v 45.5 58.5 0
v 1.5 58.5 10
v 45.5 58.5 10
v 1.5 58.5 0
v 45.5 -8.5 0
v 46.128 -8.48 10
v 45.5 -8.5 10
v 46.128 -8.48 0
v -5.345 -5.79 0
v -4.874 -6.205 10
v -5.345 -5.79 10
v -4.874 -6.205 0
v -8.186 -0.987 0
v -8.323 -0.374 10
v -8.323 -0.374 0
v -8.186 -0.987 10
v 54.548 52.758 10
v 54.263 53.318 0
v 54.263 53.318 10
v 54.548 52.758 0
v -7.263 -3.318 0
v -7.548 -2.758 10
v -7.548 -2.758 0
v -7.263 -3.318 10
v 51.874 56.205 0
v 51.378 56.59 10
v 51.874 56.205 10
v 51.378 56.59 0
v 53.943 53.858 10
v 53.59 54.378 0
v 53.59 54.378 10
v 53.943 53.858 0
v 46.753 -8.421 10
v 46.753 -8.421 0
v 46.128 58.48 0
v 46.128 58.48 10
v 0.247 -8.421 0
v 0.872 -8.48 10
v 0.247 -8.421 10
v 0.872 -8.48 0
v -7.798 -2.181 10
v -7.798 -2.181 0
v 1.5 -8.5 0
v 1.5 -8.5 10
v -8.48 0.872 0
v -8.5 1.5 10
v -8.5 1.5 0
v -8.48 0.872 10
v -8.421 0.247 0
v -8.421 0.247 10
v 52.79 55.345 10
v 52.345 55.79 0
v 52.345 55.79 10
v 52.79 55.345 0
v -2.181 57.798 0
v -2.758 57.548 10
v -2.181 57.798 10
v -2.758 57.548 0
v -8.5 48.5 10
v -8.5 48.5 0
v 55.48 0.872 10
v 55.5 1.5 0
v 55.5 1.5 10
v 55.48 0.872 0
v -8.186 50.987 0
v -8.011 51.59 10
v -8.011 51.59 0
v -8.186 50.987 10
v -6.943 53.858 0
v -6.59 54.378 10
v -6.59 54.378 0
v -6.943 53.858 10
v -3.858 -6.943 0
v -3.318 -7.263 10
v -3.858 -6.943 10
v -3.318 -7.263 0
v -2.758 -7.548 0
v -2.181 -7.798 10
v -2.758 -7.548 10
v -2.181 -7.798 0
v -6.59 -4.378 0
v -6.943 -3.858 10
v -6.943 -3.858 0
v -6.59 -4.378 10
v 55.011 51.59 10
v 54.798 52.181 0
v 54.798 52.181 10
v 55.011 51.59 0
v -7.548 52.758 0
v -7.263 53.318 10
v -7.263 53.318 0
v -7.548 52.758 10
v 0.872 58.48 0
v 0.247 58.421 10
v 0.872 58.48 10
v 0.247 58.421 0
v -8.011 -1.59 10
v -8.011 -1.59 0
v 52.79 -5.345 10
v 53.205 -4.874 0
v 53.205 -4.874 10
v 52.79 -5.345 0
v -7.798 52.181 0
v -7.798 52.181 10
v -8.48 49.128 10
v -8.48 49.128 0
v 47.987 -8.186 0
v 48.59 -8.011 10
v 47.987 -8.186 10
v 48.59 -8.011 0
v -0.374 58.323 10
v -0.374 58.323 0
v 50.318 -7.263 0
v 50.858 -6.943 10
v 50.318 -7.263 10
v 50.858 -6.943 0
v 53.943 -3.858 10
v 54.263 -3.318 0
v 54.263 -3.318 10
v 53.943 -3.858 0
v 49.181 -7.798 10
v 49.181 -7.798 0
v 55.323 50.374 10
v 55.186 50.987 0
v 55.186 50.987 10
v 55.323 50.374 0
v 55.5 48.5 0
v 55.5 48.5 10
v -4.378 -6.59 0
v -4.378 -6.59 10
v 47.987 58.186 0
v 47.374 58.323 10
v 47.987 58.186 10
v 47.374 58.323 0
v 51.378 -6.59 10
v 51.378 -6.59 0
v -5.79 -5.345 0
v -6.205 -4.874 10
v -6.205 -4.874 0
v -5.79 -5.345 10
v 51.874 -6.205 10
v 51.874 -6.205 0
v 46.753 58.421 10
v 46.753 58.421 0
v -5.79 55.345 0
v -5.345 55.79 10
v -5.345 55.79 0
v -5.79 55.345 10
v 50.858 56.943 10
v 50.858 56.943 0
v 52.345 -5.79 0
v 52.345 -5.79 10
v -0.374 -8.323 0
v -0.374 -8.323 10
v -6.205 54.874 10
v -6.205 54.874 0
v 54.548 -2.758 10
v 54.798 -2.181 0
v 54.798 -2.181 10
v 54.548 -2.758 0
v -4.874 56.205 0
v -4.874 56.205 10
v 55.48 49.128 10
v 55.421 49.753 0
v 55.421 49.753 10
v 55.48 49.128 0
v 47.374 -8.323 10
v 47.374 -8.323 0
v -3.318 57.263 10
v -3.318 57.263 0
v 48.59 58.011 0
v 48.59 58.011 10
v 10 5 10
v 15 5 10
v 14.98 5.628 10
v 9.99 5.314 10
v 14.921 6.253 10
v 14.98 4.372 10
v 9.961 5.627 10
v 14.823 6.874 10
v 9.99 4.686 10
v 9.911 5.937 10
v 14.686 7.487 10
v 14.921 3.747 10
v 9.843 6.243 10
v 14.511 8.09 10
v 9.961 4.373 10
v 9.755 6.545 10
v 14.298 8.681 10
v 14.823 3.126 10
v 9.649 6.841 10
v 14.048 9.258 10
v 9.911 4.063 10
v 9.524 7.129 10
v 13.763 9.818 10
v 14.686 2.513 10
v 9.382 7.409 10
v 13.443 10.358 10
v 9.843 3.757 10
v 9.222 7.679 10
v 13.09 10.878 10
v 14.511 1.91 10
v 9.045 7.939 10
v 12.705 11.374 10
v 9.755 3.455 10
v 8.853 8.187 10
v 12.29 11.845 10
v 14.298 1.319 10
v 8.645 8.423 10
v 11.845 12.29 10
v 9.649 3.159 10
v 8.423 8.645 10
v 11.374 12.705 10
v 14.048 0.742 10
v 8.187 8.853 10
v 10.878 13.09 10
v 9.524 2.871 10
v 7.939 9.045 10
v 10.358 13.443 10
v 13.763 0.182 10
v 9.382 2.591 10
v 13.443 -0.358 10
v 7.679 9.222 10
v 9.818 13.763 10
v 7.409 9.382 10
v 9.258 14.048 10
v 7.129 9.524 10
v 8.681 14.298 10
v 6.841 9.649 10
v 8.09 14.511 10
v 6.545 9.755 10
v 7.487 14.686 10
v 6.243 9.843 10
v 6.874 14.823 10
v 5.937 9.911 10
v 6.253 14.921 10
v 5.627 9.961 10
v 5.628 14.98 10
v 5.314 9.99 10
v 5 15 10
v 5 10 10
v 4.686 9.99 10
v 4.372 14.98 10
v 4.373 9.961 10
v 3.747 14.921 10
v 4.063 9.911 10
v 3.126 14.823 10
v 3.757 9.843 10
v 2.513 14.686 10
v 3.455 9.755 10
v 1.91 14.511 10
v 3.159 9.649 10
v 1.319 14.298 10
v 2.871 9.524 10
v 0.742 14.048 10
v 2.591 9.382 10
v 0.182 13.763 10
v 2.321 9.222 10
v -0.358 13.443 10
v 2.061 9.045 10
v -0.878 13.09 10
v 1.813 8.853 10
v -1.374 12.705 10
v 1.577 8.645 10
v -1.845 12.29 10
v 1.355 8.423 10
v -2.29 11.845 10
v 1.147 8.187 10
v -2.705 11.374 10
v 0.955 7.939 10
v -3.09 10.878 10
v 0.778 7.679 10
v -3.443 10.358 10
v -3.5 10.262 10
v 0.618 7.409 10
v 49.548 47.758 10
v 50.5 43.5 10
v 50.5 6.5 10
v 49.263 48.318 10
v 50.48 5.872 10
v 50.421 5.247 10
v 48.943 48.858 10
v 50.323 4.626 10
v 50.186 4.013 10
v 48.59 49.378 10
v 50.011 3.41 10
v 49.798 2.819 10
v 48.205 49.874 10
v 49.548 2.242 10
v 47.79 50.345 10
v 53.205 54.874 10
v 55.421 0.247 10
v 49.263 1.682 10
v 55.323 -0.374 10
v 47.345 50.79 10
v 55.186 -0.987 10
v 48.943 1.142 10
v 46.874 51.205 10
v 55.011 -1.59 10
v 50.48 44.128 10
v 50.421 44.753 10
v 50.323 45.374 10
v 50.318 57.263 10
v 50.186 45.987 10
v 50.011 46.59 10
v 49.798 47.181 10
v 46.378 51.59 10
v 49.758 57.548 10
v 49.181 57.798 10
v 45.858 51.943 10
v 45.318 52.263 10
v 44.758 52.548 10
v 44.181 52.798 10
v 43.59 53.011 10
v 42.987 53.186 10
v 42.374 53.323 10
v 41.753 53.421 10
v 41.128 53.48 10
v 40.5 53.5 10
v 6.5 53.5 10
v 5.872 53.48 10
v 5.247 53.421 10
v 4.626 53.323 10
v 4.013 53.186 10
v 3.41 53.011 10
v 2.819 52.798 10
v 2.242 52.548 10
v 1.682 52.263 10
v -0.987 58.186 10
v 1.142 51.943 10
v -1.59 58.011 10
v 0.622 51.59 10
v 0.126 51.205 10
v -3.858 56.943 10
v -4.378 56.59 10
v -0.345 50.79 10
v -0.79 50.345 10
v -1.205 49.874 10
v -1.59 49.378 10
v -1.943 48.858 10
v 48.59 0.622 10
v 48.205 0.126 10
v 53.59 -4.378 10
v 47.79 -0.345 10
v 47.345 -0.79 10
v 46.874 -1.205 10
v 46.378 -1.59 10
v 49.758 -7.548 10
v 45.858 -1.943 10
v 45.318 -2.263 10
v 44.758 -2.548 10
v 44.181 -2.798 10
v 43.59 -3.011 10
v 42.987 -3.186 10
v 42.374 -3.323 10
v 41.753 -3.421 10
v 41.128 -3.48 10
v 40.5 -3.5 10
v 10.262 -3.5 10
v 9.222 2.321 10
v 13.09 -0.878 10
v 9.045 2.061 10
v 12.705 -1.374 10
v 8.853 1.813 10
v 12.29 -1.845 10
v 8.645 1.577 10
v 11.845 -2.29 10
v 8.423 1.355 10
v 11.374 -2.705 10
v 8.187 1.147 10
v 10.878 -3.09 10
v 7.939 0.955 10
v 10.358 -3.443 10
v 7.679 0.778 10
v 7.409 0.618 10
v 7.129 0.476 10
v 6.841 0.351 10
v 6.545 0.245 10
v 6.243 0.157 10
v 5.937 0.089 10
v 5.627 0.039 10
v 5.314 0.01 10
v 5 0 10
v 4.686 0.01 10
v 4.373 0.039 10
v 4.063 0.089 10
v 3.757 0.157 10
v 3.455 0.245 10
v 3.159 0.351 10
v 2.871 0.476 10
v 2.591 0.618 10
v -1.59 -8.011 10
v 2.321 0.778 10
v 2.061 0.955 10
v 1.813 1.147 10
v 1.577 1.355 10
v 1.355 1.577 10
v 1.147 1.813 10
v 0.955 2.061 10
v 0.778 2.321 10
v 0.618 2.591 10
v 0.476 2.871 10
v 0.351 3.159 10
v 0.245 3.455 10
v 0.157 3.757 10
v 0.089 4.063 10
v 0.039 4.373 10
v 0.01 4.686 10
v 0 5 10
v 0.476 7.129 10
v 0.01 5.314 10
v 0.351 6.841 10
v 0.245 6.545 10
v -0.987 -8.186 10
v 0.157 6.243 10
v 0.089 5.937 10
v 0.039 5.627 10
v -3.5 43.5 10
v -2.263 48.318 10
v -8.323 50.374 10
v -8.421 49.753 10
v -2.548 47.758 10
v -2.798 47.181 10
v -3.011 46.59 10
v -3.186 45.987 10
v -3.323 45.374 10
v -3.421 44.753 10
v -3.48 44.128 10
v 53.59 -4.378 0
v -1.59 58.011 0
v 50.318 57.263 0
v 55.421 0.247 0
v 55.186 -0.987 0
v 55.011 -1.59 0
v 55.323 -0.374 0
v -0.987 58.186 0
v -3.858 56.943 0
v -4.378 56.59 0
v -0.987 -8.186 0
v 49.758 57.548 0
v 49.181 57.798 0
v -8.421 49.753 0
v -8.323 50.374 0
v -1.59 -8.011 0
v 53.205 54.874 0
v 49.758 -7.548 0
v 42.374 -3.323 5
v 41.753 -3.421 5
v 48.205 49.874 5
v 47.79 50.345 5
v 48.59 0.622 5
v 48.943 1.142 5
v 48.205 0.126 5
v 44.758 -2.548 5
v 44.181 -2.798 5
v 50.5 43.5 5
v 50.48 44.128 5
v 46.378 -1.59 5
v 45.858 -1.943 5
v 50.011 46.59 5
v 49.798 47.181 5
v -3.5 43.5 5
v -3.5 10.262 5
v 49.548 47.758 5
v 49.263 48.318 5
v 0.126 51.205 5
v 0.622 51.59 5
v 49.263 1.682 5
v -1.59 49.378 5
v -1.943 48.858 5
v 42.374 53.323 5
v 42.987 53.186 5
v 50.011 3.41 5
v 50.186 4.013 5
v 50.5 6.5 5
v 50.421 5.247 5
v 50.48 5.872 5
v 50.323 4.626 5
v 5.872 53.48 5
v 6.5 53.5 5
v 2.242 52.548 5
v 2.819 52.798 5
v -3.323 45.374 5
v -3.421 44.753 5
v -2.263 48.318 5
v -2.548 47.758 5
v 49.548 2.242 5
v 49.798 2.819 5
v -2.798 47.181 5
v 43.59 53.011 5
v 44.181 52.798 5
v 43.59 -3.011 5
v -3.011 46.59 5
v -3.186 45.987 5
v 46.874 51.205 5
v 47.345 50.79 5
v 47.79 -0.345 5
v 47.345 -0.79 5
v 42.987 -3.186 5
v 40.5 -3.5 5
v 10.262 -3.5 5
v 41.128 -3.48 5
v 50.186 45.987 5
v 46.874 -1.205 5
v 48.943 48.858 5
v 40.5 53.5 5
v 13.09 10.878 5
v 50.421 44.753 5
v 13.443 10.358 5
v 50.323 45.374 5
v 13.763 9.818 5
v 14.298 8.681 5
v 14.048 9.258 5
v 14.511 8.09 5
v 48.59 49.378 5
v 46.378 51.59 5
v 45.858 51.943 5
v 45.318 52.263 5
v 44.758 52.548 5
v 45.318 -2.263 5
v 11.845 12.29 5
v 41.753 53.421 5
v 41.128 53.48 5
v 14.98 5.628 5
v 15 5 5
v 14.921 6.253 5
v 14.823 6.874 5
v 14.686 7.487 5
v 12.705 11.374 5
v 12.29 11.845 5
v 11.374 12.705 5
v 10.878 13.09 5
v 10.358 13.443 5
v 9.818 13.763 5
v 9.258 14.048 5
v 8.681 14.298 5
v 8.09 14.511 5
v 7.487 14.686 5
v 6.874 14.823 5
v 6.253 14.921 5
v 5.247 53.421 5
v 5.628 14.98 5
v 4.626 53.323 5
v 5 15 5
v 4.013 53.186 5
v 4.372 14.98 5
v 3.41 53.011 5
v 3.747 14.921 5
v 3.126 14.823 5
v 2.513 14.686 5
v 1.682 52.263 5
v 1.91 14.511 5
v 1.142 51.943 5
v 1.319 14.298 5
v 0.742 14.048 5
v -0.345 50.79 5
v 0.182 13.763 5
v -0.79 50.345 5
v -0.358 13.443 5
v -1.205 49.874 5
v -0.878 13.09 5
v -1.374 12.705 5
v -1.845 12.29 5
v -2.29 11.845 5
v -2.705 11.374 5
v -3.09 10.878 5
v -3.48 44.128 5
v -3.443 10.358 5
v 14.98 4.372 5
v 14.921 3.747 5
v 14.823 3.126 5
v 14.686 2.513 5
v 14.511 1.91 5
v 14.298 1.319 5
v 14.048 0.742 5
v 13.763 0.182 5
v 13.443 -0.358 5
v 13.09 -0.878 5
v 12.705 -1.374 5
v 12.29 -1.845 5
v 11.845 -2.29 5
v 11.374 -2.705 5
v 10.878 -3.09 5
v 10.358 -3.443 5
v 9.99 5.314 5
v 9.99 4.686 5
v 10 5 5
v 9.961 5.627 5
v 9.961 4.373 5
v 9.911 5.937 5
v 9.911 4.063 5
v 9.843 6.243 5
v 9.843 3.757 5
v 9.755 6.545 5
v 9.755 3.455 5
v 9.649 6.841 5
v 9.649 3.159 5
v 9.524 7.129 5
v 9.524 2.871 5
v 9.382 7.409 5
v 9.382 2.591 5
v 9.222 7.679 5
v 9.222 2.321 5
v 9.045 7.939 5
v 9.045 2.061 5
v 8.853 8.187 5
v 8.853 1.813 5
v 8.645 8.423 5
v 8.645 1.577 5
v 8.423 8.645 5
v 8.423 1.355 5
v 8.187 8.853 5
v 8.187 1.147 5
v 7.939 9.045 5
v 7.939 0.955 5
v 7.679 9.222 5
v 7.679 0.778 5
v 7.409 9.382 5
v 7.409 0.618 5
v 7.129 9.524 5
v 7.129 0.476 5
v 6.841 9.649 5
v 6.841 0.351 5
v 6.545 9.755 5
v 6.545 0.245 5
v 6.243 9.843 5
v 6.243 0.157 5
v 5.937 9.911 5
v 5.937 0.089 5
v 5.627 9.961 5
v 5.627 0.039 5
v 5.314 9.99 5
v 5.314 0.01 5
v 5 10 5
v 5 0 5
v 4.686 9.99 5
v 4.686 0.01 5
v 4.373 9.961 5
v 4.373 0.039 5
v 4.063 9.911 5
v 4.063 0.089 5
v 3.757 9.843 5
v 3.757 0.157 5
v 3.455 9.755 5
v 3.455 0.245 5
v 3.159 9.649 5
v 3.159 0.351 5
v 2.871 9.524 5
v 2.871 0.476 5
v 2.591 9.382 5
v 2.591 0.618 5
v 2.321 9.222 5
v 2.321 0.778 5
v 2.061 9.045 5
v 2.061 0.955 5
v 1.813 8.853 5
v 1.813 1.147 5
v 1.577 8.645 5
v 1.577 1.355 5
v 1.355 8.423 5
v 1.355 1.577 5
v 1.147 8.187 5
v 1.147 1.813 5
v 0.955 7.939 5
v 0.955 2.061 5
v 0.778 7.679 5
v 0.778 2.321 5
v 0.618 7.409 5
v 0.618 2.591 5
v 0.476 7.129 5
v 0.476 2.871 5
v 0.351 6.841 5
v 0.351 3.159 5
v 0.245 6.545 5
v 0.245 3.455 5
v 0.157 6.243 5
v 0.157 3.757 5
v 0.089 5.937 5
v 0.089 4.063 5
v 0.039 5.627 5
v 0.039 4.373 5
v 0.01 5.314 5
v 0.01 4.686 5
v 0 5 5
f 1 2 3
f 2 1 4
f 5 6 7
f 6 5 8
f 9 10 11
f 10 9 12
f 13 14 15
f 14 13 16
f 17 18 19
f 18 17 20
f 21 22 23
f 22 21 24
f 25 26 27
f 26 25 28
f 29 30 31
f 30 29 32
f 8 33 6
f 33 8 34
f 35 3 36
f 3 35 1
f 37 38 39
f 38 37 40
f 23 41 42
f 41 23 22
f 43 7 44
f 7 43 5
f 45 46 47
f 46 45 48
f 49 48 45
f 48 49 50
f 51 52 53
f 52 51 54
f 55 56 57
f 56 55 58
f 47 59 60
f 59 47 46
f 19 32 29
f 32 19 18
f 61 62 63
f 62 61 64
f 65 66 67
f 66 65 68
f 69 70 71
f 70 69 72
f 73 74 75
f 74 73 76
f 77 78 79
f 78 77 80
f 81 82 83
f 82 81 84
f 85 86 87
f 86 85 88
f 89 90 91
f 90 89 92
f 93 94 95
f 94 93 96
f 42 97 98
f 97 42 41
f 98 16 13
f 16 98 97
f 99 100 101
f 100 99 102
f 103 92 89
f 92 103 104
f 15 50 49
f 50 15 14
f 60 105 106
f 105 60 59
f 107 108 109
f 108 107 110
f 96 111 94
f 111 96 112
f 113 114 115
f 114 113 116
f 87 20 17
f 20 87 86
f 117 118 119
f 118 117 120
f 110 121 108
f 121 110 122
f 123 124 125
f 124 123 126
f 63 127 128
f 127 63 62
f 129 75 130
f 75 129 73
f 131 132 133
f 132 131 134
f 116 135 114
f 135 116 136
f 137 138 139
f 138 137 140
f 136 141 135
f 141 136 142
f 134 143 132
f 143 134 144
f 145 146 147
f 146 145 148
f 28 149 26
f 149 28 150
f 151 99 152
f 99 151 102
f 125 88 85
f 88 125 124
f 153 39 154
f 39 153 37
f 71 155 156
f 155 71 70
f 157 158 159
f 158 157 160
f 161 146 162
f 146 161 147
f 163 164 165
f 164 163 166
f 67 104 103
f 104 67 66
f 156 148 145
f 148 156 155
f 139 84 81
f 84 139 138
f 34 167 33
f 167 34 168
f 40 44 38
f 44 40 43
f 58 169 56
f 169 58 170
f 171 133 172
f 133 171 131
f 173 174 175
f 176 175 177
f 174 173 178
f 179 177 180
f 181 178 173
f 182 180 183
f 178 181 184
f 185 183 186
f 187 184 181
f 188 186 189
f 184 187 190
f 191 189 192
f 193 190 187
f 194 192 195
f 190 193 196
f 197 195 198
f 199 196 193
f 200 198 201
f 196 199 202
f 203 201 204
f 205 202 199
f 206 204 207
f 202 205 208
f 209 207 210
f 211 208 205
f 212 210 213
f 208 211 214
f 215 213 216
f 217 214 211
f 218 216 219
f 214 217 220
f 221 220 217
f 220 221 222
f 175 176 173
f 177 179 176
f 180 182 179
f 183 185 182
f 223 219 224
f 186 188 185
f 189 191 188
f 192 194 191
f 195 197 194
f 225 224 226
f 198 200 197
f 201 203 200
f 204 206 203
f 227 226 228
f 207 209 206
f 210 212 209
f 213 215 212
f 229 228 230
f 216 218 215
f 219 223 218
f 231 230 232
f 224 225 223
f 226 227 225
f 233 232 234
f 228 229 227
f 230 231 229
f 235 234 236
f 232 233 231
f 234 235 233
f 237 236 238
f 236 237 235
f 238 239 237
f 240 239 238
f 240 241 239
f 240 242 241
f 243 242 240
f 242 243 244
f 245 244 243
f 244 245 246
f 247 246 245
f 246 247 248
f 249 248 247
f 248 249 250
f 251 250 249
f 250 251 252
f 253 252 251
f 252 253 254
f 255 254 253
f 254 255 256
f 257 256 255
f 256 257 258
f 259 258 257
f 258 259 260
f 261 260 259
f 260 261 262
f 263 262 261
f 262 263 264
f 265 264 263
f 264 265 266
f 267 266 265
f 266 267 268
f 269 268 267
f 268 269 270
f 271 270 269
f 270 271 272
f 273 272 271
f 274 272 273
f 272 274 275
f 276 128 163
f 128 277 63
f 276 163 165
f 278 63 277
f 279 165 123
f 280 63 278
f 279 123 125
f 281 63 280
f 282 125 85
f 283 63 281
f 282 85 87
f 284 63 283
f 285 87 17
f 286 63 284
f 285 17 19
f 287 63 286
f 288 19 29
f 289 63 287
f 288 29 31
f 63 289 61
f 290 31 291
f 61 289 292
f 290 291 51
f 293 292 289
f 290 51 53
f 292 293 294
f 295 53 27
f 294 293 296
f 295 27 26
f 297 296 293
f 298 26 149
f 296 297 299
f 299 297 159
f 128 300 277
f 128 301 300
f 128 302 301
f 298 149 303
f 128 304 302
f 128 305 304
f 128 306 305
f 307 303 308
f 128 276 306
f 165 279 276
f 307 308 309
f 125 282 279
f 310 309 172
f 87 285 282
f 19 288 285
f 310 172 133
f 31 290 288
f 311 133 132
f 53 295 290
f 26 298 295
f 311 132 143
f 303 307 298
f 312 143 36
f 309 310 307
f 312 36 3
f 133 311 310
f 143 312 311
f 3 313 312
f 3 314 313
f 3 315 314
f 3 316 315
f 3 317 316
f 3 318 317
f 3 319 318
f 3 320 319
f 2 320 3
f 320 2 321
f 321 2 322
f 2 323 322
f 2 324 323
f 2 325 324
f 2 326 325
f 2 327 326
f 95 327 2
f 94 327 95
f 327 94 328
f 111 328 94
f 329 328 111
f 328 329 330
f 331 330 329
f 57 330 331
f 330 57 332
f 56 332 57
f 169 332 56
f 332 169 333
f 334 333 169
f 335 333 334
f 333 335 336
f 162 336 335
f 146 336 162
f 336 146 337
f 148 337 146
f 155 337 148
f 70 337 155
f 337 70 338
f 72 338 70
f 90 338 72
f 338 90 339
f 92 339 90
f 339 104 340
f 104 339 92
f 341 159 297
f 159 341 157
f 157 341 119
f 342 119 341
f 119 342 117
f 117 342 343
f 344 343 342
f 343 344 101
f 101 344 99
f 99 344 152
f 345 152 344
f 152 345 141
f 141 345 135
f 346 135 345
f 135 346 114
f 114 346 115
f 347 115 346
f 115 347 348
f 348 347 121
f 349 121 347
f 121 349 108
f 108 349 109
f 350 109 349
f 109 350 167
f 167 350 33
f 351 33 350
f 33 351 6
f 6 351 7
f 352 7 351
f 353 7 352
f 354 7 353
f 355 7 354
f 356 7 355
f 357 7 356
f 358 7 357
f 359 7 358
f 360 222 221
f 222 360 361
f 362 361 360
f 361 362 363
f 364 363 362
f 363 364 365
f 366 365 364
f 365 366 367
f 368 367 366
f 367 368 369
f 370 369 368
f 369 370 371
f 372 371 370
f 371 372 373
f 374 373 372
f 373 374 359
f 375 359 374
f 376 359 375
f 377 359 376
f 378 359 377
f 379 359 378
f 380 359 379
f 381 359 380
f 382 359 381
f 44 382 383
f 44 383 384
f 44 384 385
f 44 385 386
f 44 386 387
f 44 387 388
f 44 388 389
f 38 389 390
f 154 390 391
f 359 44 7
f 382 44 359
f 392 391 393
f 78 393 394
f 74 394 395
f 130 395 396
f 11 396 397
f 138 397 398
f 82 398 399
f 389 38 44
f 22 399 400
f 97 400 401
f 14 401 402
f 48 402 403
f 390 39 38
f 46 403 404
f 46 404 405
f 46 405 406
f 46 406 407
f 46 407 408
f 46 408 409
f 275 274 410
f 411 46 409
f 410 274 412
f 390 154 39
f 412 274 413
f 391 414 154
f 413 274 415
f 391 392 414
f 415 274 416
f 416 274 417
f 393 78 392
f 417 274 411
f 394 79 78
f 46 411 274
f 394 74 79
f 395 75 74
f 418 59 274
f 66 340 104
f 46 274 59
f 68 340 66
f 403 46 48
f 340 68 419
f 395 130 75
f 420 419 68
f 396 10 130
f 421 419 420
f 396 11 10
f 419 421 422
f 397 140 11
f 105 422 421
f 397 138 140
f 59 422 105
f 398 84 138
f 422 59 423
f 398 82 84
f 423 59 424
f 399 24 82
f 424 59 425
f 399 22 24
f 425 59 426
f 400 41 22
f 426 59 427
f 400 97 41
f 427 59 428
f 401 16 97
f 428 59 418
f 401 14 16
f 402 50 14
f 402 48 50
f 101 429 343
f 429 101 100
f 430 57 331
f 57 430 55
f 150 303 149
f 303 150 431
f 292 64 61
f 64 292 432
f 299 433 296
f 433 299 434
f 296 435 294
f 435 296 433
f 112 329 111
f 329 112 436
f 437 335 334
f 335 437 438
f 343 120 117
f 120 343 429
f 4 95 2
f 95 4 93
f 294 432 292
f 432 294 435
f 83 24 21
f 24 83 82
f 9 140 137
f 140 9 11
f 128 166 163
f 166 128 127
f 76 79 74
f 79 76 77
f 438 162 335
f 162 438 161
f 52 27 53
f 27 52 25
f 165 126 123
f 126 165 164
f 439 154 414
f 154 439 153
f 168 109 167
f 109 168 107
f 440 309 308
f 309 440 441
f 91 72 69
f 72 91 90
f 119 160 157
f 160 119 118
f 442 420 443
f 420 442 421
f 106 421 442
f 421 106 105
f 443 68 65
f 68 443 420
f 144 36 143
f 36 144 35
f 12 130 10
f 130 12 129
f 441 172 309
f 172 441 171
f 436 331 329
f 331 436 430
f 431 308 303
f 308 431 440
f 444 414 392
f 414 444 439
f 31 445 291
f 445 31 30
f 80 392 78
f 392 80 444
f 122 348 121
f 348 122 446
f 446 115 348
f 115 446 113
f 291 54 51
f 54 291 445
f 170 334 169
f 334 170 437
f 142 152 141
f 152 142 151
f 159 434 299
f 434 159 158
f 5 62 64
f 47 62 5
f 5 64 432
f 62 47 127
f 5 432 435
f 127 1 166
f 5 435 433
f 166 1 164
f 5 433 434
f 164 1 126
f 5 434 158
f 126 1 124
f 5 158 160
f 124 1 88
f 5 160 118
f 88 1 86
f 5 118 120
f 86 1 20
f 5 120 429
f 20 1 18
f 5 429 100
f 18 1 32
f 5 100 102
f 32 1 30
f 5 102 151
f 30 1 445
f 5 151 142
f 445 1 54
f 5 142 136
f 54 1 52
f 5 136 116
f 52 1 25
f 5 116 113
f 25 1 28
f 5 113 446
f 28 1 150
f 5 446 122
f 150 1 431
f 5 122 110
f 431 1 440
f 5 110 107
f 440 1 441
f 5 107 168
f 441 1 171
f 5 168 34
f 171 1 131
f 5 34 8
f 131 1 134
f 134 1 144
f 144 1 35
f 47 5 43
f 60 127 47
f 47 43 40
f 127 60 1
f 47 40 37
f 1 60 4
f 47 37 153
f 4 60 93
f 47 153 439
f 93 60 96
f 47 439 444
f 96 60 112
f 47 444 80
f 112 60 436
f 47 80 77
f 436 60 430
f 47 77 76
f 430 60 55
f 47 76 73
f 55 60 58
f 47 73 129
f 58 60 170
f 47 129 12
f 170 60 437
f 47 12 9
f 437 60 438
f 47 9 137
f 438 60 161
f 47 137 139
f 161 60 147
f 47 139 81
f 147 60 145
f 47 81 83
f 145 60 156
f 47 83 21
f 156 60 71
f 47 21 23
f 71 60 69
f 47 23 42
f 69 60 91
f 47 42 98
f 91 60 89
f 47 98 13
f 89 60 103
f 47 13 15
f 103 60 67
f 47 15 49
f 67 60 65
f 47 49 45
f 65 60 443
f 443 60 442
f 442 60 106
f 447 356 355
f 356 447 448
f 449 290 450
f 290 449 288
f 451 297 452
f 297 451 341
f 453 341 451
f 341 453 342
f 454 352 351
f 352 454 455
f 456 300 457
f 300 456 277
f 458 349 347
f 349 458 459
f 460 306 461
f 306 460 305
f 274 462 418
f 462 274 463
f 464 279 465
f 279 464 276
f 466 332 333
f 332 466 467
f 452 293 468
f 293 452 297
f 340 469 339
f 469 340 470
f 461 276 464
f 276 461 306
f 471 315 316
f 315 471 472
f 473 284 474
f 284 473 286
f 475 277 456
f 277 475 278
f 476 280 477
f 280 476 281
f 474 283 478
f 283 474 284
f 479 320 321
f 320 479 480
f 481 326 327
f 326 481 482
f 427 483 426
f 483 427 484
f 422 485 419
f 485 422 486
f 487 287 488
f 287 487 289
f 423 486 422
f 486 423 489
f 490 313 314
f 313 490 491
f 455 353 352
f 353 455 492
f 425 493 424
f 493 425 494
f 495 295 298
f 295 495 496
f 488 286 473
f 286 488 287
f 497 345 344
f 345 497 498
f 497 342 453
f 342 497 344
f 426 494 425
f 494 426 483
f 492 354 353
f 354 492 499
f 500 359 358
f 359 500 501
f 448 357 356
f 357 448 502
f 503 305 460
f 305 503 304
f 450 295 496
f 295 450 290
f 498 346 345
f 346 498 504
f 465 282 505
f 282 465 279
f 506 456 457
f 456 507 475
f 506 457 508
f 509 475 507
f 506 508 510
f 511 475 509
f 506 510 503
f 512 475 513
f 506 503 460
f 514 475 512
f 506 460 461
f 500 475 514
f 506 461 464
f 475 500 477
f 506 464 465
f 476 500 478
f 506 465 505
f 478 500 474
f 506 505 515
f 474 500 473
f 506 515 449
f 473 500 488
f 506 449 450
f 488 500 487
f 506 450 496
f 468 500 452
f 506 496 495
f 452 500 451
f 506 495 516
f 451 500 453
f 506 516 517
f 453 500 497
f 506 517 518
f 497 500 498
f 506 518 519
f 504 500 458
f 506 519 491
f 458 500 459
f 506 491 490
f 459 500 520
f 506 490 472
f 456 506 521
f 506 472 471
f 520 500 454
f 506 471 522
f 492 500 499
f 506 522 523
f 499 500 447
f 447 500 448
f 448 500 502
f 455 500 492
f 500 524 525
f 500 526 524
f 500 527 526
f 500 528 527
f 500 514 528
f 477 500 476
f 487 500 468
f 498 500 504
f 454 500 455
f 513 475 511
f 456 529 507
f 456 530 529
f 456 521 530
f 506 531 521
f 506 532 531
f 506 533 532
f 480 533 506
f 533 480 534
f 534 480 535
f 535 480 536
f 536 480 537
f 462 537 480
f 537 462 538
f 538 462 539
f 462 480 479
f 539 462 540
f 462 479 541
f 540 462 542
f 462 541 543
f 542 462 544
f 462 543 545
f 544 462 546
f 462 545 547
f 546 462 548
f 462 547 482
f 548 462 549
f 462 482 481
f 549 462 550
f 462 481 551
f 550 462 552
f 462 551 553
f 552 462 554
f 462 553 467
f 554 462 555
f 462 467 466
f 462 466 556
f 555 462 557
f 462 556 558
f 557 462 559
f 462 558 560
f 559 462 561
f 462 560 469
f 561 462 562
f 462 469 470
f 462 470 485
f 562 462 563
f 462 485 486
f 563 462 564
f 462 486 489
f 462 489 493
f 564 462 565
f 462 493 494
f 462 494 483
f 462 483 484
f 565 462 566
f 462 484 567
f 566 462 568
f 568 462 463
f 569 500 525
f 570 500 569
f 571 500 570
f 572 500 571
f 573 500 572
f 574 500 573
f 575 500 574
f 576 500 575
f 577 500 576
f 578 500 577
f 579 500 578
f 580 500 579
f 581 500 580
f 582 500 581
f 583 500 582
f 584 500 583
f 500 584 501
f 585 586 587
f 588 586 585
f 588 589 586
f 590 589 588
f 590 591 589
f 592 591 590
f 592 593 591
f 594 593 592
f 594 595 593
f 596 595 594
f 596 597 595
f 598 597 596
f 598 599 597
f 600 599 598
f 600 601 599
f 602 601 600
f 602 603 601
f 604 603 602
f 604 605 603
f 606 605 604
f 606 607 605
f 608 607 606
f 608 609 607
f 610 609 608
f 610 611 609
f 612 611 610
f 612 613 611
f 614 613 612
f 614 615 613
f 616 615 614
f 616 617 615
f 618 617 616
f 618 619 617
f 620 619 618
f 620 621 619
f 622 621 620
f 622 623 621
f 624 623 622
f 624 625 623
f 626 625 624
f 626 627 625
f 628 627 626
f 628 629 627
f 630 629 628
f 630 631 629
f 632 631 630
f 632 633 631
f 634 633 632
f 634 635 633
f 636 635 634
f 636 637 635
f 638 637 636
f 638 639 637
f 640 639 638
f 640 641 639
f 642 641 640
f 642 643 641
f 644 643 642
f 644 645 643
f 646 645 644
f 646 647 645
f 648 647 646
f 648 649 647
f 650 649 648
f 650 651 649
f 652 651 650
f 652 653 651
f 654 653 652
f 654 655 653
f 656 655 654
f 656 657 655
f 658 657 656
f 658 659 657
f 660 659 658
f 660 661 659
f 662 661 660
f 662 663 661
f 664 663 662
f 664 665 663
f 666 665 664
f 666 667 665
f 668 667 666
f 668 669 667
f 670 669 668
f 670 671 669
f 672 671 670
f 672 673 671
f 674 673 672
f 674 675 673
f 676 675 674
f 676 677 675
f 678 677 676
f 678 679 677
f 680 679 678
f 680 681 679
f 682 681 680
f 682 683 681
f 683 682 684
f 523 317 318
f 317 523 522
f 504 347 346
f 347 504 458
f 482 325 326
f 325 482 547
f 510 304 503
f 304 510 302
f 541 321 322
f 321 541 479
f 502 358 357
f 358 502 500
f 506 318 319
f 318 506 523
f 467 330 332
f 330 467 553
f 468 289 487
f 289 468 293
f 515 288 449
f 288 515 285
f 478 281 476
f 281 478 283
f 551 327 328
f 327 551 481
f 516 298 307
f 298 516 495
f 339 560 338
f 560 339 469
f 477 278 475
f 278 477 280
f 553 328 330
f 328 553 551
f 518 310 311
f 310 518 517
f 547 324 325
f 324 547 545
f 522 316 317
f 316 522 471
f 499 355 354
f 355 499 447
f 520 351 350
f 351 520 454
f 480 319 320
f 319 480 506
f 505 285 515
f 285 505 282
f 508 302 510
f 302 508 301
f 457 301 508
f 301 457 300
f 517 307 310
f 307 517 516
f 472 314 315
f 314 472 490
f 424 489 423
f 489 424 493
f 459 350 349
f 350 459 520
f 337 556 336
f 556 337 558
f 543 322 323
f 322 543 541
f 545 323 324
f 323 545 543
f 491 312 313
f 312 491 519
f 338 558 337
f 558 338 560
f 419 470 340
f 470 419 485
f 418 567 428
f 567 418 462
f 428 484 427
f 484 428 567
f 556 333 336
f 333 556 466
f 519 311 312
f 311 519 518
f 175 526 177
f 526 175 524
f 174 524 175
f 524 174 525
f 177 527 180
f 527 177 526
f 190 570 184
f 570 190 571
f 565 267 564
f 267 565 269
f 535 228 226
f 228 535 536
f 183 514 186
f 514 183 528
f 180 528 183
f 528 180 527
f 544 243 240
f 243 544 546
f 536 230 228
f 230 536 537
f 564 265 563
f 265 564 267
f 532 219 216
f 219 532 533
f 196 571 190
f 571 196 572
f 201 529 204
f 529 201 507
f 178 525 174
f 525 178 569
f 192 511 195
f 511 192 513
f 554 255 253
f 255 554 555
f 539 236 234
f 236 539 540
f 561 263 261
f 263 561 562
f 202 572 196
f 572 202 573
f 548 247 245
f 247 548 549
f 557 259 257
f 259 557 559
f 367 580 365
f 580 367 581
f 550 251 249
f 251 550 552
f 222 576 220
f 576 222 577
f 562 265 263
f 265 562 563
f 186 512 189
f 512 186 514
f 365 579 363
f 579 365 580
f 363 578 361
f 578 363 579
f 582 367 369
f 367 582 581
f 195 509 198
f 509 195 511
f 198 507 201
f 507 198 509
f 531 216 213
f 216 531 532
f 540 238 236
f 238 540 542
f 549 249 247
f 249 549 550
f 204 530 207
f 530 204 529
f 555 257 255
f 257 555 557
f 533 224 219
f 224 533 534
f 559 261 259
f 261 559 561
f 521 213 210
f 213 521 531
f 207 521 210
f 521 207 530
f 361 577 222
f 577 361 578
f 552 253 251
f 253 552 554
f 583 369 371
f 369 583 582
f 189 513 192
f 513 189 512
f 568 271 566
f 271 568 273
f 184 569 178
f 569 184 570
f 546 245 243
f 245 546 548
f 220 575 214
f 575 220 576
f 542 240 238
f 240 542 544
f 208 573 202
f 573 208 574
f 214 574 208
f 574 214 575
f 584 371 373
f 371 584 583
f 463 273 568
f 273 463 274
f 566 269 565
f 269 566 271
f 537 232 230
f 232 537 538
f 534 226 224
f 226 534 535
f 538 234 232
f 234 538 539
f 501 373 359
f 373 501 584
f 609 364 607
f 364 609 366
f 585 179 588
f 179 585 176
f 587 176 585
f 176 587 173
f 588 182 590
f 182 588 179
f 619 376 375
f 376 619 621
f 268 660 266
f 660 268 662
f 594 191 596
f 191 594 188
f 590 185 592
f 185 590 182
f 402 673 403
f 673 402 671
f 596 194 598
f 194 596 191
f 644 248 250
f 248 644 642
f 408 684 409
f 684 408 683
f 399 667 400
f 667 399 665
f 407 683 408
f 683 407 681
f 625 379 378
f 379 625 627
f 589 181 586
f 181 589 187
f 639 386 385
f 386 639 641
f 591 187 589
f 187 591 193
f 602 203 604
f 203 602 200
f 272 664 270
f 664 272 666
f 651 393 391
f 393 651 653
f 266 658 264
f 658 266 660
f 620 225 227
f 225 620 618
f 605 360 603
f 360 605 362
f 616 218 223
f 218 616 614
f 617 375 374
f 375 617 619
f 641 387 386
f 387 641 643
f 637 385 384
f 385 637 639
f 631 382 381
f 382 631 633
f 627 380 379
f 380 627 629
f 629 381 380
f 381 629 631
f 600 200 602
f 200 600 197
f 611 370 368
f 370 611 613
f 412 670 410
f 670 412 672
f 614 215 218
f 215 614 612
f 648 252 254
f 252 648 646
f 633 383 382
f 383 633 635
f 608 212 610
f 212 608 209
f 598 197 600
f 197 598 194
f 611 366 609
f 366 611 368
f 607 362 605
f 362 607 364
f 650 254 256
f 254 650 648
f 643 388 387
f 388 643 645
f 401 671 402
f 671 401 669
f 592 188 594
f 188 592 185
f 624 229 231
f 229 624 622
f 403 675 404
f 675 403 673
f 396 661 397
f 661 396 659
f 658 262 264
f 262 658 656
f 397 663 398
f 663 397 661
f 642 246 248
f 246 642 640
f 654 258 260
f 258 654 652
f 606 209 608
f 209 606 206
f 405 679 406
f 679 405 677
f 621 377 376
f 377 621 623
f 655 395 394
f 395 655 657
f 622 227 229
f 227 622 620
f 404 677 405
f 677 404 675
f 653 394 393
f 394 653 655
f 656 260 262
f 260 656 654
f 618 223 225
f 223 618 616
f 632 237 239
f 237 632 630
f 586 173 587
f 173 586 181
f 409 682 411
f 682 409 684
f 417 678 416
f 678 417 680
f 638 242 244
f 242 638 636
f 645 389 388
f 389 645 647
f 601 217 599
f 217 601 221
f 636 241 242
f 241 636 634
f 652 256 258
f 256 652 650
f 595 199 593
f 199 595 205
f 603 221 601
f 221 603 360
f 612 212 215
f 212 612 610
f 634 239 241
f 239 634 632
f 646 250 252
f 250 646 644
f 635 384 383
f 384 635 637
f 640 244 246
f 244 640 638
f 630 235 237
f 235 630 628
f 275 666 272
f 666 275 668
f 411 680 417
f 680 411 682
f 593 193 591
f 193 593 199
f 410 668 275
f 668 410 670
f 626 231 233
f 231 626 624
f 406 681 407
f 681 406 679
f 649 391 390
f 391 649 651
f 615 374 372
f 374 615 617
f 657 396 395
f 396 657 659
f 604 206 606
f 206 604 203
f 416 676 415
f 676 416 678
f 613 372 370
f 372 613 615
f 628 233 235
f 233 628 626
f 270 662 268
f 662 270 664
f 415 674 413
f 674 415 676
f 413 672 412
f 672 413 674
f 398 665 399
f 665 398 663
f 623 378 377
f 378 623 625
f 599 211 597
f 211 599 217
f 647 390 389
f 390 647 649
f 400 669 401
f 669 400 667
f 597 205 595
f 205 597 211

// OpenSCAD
//translate([5,5,0]) cylinder(r=10,h=10,$fn=100) ;

difference(){
          
        hull(){
            translate([1.5,1.5,0])cylinder(r=10,h=10,$fn=100);
            translate([45.5,1.5,0])cylinder(r=10,h=10,$fn=100);
            translate([1.5,48.5,0])cylinder(r=10,h=10,$fn=100);
            translate([45.5,48.5,0])cylinder(r=10,h=10,$fn=100);
        }
    
    
        hull(){
            translate([6.5,6.5,5])cylinder(r=10,h=5,$fn=100);
            translate([40.5,6.5,5])cylinder(r=10,h=5,$fn=100);
            translate([6.5,43.5,5])cylinder(r=10,h=5,$fn=100);
            translate([40.5,43.5,5])cylinder(r=10,h=5,$fn=100);
        }
    } 
    

difference(){
    translate([5,5,0])  cylinder(r=10,h=10,$fn=100) ;
    translate([5,5,-5]) cylinder(r=5,h=30,$fn=100) ;     
}

translate([-2,-18,0]) color("green")scale([1.2,1.2,1]) linear_extrude(height = 10)  import("m_arriba.dxf");
translate([-16,-16,0]) color("black") scale([1.2,1.2,1]) linear_extrude(height = 10) import("m_abajo.dxf");
